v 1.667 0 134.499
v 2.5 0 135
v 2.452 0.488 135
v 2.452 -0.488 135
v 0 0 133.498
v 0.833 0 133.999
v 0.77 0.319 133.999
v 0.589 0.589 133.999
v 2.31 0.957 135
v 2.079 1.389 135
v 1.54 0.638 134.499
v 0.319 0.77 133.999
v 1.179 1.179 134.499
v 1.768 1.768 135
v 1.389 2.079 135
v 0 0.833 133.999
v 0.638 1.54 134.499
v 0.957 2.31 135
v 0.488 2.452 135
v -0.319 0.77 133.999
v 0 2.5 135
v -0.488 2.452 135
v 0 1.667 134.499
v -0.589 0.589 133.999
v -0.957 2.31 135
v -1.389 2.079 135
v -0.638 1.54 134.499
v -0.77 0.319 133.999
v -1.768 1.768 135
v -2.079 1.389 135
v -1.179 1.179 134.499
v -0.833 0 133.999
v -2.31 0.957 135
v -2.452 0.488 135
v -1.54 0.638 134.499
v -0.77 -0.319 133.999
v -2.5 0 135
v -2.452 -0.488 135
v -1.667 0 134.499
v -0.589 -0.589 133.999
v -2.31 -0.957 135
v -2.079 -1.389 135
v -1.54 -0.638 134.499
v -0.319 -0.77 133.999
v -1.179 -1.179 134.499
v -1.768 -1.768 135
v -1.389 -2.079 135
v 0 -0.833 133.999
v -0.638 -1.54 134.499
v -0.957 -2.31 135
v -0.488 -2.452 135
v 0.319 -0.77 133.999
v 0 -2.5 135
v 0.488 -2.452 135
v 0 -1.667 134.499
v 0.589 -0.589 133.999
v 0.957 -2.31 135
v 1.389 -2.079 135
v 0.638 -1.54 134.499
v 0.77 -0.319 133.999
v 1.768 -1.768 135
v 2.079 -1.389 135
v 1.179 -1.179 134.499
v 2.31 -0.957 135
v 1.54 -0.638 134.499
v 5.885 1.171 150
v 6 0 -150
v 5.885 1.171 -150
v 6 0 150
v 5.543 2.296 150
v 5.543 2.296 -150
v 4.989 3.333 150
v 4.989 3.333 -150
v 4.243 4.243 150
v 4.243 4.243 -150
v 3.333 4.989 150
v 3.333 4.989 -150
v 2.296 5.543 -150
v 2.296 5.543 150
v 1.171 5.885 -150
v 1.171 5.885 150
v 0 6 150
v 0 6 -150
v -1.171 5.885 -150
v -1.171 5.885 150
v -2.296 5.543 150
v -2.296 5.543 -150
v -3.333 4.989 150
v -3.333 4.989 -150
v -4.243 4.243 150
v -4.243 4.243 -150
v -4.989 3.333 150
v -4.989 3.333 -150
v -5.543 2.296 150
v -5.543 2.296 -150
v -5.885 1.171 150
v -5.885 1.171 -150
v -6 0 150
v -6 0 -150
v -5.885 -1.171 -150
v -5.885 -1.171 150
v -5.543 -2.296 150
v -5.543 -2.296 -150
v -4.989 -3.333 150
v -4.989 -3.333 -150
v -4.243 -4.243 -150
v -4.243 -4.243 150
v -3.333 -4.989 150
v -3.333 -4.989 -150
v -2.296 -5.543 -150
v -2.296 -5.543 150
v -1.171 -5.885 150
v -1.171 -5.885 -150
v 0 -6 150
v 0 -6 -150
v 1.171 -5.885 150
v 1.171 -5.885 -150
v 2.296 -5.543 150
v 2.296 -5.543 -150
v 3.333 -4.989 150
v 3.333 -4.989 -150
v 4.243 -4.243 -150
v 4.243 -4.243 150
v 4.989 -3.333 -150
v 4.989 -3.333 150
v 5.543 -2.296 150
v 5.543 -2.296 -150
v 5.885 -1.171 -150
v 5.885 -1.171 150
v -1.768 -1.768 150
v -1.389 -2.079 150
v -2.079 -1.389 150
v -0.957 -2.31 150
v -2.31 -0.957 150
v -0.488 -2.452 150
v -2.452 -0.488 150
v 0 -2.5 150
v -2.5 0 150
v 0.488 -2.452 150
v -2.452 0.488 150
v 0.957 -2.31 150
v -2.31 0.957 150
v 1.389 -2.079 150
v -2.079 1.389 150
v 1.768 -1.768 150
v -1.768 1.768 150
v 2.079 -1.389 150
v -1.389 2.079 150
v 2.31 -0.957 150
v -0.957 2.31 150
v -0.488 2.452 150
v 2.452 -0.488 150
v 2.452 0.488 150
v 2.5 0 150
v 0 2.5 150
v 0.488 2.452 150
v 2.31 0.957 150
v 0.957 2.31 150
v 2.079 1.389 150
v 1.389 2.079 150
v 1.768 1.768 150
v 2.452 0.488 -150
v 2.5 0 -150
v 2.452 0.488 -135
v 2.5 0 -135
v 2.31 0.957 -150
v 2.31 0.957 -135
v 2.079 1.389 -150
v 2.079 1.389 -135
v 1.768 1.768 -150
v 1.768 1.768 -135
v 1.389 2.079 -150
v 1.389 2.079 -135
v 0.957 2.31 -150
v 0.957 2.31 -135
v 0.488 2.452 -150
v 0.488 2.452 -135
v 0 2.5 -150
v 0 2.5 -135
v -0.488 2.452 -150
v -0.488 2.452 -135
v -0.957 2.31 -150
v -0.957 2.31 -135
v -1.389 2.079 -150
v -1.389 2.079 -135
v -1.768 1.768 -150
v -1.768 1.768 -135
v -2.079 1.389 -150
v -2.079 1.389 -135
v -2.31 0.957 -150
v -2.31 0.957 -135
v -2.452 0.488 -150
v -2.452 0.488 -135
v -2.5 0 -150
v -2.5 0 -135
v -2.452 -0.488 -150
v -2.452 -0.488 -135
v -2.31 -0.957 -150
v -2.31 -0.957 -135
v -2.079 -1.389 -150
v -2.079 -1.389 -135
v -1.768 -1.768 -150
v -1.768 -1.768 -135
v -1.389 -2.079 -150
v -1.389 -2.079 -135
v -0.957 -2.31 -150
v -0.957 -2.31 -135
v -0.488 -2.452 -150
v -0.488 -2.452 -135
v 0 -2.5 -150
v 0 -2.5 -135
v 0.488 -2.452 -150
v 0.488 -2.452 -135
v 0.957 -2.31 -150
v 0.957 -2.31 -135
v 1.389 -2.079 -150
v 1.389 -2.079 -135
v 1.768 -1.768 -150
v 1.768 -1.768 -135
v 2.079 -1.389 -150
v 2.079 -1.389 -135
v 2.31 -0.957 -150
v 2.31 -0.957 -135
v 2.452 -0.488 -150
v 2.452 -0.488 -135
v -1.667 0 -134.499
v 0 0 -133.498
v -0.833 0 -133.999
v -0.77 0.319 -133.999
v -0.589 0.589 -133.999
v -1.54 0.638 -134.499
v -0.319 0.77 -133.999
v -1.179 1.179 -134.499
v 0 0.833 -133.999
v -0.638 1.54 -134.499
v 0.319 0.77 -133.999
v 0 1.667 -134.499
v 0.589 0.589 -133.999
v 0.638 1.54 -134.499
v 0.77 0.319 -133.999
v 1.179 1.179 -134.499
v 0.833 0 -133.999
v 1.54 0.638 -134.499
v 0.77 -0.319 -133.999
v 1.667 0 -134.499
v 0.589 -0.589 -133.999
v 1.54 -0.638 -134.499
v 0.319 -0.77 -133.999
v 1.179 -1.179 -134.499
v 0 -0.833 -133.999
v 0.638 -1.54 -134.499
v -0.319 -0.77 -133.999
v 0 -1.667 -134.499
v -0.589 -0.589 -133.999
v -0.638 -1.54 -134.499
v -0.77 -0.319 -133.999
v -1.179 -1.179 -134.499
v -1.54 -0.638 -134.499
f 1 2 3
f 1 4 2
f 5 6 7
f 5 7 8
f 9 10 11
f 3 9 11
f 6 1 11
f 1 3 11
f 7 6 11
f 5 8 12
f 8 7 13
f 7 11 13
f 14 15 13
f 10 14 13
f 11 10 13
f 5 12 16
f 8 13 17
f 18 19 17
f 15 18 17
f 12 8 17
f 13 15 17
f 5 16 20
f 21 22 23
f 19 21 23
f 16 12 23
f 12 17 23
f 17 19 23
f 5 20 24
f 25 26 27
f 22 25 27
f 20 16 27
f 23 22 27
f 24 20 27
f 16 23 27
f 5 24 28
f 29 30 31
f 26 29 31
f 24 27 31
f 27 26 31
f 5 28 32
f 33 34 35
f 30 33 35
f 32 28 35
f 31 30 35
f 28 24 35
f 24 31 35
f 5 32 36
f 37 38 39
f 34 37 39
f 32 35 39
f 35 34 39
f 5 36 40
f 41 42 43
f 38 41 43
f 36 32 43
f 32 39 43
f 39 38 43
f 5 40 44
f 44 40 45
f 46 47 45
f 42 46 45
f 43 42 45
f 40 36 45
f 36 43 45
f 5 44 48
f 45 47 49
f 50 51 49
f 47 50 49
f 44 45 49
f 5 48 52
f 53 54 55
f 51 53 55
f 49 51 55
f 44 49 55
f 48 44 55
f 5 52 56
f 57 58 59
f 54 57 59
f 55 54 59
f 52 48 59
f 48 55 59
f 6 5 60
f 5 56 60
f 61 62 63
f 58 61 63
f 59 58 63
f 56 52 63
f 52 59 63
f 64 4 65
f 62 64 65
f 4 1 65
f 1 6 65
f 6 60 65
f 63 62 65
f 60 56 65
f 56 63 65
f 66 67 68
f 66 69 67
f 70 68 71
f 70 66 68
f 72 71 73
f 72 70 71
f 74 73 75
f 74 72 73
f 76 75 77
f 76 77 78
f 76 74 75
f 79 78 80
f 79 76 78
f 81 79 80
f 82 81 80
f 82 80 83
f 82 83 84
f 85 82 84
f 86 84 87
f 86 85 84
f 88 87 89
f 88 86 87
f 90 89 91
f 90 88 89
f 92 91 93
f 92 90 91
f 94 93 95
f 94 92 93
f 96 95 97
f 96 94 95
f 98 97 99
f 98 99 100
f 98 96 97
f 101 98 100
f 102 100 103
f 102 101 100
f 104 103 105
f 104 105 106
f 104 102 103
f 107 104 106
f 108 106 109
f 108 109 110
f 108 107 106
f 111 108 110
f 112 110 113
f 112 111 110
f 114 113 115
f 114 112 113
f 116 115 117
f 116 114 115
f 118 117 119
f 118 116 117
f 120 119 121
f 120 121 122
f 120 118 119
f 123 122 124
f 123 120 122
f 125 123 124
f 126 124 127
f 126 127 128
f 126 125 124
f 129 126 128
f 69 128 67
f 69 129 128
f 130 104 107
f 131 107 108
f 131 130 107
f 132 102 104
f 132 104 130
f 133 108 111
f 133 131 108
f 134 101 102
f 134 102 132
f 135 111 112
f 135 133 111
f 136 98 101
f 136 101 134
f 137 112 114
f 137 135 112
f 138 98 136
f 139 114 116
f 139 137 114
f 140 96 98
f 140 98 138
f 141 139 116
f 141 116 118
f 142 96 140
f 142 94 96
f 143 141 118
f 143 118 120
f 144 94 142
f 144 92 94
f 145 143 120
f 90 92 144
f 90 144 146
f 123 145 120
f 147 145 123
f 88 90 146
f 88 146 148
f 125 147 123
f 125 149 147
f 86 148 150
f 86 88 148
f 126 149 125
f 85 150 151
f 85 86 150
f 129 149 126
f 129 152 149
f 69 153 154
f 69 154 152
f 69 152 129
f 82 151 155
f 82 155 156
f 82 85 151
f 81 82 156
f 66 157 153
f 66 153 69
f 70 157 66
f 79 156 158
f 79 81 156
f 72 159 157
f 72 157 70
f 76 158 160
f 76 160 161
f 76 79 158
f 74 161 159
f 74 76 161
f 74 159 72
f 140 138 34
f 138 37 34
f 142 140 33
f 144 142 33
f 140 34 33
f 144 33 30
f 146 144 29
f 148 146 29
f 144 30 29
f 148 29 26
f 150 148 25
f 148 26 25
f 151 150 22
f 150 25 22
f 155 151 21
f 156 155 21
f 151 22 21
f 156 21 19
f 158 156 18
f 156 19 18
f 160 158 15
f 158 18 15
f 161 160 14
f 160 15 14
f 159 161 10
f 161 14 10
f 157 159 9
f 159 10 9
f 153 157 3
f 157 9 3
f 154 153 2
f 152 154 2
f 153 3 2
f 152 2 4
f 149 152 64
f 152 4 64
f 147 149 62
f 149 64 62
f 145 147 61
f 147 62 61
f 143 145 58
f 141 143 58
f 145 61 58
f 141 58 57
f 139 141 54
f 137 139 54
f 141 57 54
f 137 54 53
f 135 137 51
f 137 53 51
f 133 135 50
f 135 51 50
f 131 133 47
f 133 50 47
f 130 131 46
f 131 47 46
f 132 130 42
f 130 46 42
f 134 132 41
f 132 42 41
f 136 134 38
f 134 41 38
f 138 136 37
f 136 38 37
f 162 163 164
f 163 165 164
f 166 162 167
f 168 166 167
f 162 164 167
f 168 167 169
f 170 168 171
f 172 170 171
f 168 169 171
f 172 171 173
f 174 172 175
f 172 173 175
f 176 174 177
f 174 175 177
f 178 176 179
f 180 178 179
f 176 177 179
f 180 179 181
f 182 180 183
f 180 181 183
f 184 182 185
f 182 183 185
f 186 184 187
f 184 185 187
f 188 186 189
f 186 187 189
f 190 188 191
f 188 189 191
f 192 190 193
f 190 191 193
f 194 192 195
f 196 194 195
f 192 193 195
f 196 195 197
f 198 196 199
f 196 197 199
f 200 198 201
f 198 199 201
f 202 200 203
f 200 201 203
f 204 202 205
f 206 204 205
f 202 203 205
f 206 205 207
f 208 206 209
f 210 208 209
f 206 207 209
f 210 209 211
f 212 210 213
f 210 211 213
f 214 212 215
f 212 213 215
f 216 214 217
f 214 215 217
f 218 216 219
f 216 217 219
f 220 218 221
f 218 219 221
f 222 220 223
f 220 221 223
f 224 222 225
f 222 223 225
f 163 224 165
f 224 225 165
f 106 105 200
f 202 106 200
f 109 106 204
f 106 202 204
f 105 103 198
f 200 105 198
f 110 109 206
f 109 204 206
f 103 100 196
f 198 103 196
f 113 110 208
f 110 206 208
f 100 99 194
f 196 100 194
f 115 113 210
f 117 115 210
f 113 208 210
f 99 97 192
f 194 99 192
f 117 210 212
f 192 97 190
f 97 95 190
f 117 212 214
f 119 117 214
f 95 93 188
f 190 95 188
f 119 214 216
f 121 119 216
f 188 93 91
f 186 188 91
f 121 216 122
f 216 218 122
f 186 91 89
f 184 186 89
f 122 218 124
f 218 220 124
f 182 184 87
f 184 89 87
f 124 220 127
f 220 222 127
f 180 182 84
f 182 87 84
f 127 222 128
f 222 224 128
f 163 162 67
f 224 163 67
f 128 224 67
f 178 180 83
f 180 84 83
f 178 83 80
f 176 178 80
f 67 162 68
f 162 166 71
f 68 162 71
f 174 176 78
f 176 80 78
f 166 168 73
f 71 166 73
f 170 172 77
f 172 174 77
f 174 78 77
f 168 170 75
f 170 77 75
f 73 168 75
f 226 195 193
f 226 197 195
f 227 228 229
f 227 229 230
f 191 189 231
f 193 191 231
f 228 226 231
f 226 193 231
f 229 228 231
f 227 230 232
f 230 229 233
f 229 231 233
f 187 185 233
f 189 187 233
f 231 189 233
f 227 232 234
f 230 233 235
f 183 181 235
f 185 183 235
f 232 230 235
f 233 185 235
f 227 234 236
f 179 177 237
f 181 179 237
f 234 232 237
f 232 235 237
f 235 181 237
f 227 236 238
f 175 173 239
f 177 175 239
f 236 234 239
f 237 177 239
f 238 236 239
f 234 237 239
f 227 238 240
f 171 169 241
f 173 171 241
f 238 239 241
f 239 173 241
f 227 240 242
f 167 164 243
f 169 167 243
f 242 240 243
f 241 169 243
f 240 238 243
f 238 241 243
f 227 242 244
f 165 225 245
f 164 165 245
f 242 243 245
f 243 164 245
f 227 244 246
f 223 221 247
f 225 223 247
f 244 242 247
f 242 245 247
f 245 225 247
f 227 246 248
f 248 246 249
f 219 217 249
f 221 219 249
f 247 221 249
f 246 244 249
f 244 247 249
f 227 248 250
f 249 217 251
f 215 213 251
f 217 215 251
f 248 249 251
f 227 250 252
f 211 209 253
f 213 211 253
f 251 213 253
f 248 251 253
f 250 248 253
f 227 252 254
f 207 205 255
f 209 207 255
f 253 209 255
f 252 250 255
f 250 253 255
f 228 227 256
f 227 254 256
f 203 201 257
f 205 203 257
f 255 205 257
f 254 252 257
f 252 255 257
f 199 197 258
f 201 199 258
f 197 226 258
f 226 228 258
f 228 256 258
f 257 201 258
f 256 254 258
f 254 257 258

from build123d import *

# Parameters (mm, degrees)
SKETCH_1_R             = 6
EXTRUDE_1_DEPTH        = 150
HOLE_WIZARD_M6_1_D     = 5
HOLE_WIZARD_M6_1_DEPTH = 15
HOLE_WIZARD_M6_1_TIP   = 1.502151548
HOLE_WIZARD_M6_2_D     = 5
HOLE_WIZARD_M6_2_DEPTH = 15
HOLE_WIZARD_M6_2_TIP   = 1.502151548


with BuildPart() as part:
    # 草图1 → 凸台-拉伸1 (new, symmetric)
    with BuildSketch(Plane.XY):
        Circle(SKETCH_1_R)
    extrude(amount=EXTRUDE_1_DEPTH, both=True)

    # M6 螺纹孔1
    with Locations(Plane(origin=(0, 0, -150), x_dir=(-1, 0, 0), z_dir=(0, 0, -1))):
        with Locations((0, 0)):
            Hole(HOLE_WIZARD_M6_1_D / 2, depth=HOLE_WIZARD_M6_1_DEPTH)
            with Locations((0, 0, -(HOLE_WIZARD_M6_1_DEPTH + HOLE_WIZARD_M6_1_TIP / 2))):  # 118° drill point
                Cone(0, HOLE_WIZARD_M6_1_D / 2, HOLE_WIZARD_M6_1_TIP, mode=Mode.SUBTRACT)

    # M6 螺纹孔2
    with Locations(Plane.XY.offset(150)):
        with Locations((0, 0)):
            Hole(HOLE_WIZARD_M6_2_D / 2, depth=HOLE_WIZARD_M6_2_DEPTH)
            with Locations((0, 0, -(HOLE_WIZARD_M6_2_DEPTH + HOLE_WIZARD_M6_2_TIP / 2))):  # 118° drill point
                Cone(0, HOLE_WIZARD_M6_2_D / 2, HOLE_WIZARD_M6_2_TIP, mode=Mode.SUBTRACT)


solid = part.part
